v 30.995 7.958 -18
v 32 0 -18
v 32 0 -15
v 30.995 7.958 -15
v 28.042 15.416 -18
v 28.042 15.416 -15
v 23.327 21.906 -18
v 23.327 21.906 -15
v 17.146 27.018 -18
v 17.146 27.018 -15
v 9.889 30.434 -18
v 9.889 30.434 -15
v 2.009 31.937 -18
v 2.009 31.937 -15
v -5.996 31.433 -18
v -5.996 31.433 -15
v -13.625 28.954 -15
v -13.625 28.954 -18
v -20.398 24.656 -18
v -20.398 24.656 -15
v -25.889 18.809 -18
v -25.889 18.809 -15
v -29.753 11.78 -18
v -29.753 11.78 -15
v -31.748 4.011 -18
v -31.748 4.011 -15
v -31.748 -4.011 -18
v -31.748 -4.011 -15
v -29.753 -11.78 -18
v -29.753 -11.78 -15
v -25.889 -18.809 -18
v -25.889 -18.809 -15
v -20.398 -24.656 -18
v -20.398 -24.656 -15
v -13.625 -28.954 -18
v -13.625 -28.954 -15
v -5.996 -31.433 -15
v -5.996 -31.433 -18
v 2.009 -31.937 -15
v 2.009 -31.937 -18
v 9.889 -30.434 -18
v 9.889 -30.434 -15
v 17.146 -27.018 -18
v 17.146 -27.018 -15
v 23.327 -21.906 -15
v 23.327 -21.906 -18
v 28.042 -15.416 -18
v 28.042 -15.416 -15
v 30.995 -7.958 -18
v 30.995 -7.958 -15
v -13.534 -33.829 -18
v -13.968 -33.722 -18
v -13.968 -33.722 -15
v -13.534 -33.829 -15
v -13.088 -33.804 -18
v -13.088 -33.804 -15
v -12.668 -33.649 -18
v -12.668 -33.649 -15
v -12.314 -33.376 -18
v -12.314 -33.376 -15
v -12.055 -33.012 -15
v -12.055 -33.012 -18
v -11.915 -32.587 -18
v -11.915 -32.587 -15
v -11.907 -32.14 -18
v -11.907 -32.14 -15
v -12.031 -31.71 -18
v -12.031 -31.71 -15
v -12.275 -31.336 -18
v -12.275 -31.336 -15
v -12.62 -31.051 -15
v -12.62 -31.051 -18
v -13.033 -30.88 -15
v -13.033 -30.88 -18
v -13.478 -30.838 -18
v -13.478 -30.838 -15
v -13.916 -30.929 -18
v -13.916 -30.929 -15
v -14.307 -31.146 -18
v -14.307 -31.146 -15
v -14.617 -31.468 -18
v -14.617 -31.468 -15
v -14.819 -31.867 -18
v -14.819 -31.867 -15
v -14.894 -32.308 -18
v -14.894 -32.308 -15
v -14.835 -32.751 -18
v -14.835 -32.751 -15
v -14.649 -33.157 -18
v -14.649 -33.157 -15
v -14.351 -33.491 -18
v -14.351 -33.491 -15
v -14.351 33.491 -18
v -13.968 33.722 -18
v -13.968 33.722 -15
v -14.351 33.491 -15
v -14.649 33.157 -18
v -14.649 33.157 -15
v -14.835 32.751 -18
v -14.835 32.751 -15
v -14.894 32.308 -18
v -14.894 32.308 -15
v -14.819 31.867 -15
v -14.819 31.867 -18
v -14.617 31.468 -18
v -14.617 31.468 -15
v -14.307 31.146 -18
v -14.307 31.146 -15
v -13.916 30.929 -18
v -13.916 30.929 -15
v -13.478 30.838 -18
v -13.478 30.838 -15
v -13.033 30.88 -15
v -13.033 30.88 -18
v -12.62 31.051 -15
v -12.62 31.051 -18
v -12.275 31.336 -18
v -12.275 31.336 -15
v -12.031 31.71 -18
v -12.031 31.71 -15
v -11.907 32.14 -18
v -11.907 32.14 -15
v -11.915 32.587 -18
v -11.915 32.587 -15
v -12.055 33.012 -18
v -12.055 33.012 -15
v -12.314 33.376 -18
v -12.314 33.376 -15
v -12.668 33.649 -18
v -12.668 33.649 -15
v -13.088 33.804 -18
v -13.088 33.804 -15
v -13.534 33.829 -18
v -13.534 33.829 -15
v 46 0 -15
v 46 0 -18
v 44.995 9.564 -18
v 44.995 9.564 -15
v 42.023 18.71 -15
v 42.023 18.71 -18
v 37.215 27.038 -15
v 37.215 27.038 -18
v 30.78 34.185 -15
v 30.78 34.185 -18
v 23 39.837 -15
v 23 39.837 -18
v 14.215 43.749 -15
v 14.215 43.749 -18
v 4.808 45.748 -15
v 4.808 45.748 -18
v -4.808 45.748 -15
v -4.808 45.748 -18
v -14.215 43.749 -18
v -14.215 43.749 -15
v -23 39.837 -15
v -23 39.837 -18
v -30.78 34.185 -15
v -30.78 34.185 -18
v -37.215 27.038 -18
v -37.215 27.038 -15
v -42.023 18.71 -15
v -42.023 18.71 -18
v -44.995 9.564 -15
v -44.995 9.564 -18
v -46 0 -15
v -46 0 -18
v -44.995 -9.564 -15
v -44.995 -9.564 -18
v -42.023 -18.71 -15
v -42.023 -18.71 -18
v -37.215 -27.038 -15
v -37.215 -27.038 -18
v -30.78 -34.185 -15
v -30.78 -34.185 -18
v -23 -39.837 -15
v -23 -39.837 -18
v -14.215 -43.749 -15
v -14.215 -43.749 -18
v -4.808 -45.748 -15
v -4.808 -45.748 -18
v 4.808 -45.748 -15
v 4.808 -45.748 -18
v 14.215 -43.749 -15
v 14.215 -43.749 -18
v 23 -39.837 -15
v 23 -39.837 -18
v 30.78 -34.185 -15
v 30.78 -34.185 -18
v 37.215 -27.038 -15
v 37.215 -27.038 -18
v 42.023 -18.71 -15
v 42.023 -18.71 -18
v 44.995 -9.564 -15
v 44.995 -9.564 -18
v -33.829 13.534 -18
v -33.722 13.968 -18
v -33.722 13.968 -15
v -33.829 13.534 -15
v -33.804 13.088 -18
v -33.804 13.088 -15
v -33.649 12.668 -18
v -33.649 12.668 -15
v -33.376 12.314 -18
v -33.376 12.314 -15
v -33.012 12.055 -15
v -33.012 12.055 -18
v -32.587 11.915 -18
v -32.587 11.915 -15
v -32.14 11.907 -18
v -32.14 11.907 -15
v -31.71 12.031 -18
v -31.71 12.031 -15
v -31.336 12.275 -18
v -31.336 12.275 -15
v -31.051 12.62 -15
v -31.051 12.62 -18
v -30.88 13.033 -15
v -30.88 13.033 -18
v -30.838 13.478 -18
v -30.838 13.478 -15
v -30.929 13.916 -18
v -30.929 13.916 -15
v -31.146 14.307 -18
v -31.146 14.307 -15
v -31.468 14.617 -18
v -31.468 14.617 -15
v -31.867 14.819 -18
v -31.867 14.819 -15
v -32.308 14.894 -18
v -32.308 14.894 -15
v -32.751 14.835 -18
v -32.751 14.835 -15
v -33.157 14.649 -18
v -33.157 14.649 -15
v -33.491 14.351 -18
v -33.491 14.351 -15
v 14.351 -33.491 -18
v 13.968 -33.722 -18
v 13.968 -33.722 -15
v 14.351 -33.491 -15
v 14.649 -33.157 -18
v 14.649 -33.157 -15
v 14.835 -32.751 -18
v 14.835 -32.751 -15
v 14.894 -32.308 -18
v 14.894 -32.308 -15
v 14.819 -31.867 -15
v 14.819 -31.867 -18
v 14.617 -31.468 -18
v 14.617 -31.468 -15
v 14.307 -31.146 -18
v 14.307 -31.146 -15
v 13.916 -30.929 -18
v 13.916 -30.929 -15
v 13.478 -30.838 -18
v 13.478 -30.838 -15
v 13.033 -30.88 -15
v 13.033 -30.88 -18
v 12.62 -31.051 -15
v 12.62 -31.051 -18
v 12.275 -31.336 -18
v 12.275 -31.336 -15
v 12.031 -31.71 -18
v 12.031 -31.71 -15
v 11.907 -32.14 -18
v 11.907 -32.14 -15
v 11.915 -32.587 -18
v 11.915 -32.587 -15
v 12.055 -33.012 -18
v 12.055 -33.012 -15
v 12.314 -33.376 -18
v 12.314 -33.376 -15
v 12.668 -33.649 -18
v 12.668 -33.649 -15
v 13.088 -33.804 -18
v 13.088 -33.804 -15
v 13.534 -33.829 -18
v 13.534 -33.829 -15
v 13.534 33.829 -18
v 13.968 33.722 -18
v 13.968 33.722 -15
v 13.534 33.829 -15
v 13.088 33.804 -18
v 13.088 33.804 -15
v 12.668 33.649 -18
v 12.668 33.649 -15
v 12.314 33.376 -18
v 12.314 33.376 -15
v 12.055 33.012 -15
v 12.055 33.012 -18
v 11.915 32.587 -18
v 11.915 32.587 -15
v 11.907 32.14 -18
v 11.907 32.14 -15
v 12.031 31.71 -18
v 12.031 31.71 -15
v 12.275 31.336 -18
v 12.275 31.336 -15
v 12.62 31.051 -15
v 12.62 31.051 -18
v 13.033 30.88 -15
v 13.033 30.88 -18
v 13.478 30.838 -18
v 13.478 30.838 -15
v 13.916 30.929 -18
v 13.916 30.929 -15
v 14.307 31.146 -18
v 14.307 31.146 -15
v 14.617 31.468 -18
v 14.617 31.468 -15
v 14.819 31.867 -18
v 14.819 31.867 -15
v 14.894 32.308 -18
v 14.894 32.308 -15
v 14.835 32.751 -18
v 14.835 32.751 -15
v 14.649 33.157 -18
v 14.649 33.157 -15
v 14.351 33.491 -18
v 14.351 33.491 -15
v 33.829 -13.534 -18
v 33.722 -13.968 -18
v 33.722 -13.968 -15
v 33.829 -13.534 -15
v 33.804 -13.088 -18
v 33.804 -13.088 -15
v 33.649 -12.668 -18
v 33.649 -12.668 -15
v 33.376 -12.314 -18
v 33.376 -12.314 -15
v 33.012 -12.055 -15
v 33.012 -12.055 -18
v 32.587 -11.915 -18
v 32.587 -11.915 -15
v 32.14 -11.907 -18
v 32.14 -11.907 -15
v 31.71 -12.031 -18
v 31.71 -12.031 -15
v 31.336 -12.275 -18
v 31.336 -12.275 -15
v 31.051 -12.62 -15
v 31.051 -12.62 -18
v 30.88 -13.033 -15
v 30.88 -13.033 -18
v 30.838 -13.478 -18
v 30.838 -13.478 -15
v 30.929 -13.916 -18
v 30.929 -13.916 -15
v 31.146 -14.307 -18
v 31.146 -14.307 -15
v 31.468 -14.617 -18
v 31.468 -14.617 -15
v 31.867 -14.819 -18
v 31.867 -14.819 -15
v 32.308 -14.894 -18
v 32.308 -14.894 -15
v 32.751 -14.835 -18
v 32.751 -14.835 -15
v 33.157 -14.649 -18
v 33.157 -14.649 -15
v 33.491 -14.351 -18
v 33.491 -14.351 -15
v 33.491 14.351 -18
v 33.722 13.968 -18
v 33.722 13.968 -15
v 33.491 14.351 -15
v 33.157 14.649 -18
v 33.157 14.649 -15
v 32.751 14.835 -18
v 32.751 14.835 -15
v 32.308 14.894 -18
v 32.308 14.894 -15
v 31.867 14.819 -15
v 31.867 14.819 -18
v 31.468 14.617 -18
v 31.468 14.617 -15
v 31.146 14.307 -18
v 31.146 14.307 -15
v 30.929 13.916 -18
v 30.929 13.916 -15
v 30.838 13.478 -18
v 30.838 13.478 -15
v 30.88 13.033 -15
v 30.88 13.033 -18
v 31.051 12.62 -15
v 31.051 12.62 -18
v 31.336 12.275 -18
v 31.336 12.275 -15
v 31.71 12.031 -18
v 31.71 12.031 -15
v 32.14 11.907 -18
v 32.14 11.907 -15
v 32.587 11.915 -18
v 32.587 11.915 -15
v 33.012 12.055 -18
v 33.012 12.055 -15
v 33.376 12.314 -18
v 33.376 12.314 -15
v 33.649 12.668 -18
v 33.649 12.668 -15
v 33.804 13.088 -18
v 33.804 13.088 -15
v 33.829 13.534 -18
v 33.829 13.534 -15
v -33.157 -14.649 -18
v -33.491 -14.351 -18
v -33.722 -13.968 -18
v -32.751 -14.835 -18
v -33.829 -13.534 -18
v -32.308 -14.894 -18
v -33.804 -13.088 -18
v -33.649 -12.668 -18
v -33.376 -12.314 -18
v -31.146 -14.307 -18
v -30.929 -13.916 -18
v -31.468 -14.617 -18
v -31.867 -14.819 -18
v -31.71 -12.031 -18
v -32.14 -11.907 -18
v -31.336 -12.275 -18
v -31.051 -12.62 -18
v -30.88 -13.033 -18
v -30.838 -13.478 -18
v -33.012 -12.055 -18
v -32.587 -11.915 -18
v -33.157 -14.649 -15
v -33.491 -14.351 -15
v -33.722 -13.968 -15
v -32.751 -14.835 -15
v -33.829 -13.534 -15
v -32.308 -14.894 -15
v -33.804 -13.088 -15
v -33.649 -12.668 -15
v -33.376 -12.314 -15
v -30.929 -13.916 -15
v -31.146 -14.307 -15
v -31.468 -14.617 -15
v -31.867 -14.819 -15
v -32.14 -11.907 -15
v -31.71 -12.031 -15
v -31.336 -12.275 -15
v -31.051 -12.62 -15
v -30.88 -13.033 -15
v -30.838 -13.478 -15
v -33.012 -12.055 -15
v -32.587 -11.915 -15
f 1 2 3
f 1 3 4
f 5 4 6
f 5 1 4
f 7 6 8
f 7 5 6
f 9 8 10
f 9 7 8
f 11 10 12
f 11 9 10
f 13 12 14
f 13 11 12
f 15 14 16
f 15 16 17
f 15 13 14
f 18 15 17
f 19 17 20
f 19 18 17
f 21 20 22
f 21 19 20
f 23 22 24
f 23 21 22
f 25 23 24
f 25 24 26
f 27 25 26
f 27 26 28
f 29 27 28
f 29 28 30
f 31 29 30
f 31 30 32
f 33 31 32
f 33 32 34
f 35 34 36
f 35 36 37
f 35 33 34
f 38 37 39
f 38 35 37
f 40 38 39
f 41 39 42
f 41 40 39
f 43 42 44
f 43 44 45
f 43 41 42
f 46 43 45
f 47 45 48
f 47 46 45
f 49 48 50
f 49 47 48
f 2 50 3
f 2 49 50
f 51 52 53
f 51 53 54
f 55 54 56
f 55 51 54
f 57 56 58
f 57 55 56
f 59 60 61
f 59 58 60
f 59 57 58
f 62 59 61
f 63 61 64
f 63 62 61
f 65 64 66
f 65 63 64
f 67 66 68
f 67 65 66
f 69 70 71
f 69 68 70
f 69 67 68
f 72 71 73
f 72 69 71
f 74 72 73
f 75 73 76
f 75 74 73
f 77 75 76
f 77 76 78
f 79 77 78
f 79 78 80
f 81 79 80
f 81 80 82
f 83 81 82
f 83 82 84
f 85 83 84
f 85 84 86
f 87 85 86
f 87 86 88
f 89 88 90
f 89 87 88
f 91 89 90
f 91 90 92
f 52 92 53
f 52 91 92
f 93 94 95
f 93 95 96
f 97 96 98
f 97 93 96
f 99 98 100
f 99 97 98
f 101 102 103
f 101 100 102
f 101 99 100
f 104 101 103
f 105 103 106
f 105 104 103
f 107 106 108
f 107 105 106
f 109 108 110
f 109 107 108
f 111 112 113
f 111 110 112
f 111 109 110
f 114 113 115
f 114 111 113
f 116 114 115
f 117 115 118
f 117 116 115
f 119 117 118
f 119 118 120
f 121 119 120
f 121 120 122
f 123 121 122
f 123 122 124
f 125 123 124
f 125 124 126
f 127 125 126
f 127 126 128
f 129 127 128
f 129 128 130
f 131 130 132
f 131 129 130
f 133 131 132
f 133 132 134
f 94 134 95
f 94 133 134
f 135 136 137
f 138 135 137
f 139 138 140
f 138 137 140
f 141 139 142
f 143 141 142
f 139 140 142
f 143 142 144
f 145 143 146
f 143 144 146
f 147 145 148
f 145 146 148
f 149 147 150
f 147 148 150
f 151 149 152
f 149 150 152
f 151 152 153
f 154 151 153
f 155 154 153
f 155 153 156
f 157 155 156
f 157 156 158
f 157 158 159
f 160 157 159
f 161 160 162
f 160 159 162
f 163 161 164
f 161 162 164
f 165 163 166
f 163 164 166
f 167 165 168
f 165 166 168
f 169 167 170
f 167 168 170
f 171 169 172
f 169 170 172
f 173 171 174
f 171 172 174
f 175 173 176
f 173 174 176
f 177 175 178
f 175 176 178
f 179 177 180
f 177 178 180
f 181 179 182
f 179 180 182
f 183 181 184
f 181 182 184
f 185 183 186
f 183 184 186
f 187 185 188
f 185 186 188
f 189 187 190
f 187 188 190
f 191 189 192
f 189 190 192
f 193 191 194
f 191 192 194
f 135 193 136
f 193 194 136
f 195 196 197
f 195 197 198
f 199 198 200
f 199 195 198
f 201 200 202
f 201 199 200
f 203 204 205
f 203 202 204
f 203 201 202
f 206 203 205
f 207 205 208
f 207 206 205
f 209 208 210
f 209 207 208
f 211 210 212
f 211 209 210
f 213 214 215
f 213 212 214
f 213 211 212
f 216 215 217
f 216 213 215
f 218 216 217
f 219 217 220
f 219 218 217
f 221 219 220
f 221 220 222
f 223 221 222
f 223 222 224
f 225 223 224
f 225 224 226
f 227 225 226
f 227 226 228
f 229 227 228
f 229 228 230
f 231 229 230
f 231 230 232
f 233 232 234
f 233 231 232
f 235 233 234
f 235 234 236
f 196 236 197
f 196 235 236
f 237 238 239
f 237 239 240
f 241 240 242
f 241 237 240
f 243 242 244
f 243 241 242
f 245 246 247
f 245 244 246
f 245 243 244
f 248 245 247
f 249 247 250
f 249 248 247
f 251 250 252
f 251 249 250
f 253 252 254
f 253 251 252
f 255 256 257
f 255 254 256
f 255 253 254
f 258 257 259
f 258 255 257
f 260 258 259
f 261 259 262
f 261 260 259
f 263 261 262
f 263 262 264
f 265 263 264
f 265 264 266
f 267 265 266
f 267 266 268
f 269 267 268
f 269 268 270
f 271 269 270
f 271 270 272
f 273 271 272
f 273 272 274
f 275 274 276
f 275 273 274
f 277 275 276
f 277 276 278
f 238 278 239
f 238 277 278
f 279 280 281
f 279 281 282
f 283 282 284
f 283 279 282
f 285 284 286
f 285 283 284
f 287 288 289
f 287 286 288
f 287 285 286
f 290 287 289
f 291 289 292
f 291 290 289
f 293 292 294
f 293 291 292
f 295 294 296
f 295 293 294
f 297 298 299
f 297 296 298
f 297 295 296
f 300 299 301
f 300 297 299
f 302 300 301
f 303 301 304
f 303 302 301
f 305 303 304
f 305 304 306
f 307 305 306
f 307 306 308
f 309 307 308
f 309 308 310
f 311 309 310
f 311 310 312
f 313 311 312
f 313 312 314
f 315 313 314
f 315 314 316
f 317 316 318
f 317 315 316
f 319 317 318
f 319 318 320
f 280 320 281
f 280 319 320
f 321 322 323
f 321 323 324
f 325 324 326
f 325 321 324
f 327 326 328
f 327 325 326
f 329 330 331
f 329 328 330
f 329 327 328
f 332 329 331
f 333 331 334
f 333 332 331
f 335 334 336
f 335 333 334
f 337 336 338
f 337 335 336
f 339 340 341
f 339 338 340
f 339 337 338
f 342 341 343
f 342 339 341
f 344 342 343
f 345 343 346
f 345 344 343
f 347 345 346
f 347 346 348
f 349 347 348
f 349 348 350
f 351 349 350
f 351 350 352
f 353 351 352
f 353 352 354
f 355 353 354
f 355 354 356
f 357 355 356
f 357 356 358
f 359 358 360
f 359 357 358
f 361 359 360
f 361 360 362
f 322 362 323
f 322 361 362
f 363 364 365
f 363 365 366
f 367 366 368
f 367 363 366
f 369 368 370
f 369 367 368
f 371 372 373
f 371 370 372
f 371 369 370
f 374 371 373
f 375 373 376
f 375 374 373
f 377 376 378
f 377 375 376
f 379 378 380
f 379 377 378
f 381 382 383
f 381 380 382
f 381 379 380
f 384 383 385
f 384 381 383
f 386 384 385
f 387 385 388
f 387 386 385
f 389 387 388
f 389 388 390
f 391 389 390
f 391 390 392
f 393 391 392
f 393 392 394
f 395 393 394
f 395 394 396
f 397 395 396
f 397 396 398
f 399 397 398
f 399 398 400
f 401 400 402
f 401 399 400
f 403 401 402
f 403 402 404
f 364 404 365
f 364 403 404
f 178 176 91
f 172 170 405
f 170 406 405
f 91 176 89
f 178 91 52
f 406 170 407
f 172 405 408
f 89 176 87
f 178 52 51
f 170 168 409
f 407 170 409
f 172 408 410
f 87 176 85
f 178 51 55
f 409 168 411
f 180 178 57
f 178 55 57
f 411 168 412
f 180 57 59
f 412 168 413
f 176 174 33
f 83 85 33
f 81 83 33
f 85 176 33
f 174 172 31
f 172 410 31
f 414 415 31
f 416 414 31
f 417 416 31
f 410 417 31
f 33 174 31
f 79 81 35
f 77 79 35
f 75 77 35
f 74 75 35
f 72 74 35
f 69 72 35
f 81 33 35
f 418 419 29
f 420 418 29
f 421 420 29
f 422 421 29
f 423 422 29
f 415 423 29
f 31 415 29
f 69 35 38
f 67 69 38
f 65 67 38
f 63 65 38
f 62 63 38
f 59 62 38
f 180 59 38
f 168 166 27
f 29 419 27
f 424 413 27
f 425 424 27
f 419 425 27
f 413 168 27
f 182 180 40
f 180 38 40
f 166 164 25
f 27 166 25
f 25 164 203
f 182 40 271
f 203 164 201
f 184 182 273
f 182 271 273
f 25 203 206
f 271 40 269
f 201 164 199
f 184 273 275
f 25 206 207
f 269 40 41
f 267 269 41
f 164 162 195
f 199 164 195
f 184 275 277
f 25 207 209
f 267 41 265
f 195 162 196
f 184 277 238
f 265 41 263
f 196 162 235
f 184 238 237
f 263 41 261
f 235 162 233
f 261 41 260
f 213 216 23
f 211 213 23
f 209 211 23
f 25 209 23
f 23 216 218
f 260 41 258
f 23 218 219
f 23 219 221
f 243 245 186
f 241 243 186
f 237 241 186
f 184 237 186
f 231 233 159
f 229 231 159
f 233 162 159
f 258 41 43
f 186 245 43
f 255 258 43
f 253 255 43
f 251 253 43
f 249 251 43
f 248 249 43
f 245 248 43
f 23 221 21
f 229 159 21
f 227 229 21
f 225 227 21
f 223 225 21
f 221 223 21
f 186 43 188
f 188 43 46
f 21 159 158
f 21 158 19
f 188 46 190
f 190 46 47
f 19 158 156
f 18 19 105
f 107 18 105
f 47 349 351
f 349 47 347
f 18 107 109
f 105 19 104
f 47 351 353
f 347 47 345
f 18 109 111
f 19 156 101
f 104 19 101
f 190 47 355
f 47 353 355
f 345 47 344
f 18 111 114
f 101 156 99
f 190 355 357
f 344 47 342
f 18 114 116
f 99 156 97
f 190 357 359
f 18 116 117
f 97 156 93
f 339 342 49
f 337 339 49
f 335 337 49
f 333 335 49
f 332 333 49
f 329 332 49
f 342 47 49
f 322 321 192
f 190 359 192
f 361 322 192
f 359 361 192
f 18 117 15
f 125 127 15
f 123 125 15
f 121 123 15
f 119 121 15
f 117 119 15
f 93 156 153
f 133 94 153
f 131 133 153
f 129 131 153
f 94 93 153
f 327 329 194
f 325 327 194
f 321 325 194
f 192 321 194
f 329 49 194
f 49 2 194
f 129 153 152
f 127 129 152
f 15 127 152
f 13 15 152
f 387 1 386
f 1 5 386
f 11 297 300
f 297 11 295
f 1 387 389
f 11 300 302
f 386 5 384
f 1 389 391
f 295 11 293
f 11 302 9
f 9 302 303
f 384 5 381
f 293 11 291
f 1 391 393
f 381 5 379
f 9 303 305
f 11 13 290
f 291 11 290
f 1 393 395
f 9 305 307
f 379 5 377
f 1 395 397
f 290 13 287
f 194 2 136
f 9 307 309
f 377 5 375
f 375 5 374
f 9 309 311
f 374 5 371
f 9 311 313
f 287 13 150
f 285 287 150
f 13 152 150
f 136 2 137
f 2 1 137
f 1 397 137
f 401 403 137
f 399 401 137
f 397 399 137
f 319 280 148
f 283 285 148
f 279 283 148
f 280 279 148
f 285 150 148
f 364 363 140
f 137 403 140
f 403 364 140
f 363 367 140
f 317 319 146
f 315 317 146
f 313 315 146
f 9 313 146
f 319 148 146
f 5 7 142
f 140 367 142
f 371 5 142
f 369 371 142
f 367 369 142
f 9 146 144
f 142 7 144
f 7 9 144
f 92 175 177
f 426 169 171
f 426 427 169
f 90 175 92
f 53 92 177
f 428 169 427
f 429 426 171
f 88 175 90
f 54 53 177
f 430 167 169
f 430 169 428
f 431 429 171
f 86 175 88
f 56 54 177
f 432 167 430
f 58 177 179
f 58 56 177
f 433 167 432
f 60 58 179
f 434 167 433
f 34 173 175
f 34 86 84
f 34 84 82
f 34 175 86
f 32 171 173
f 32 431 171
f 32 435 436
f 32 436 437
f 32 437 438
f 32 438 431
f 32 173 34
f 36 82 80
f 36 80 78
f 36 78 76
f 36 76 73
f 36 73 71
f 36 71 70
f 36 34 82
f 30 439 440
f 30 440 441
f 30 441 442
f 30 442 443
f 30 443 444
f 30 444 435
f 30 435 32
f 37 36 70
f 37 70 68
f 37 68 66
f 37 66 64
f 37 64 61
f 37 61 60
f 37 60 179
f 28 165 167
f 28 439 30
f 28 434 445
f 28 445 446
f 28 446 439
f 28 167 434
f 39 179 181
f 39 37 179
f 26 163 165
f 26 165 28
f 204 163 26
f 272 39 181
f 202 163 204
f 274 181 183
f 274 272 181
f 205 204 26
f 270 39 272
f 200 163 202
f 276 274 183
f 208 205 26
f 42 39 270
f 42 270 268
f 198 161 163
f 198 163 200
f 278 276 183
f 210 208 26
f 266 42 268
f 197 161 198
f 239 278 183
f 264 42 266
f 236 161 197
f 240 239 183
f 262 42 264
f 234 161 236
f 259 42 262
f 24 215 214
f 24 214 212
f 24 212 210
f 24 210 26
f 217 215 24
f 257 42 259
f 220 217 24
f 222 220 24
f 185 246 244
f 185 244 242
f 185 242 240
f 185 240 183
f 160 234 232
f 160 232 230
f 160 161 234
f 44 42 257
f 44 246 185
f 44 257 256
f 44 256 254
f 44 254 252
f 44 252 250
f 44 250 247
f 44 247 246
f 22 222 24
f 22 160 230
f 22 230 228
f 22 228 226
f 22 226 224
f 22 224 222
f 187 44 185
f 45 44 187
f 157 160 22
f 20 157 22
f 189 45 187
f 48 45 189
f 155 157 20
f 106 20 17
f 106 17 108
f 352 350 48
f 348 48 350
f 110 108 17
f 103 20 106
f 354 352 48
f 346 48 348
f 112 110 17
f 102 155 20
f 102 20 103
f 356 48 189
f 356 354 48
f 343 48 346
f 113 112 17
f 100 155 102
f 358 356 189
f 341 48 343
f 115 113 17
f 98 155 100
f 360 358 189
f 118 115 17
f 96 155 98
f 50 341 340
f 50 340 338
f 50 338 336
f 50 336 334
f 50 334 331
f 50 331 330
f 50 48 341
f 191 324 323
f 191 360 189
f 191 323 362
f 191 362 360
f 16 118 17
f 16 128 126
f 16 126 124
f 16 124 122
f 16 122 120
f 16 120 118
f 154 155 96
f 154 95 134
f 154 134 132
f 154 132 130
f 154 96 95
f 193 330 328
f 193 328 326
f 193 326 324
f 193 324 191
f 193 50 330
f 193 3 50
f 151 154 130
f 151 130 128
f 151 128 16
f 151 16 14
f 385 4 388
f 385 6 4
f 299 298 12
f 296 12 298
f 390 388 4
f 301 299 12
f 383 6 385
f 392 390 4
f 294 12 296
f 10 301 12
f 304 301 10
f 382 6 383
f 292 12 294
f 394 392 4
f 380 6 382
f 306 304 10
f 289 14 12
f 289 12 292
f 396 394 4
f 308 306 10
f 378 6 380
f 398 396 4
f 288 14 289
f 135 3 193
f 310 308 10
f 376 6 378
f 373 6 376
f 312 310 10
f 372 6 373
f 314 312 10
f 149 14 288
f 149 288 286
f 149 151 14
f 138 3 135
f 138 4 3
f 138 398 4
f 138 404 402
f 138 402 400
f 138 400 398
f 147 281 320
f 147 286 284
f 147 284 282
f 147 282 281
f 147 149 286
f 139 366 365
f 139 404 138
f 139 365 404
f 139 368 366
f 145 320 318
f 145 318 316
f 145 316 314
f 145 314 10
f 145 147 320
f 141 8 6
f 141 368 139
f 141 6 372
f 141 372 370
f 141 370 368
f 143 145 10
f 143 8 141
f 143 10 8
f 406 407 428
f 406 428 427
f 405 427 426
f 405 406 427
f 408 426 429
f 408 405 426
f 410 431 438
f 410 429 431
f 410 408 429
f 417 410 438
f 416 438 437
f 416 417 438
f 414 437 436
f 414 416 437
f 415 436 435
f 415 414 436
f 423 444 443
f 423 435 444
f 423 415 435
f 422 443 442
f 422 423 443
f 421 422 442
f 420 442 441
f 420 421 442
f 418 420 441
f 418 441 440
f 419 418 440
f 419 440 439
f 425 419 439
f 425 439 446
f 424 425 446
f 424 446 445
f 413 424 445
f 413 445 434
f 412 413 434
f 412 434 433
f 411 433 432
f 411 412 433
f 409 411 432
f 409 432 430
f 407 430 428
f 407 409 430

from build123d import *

# Parameters (mm, degrees)
CYLINDER237_R               = 1.5
CYLINDER237_DEPTH           = 20
CYLINDER237_PLACEMENT_ANGLE = 67.5
CYLINDER244_R               = 1.5
CYLINDER244_DEPTH           = 20
CYLINDER244_PLACEMENT_ANGLE = 112.500001
CYLINDER239_R               = 1.5
CYLINDER239_DEPTH           = 20
CYLINDER239_PLACEMENT_ANGLE = 157.5
CYLINDER242_R               = 1.5
CYLINDER242_DEPTH           = 20
CYLINDER242_PLACEMENT_ANGLE = 202.5
CYLINDER240_R               = 1.5
CYLINDER240_DEPTH           = 20
CYLINDER240_PLACEMENT_ANGLE = 112.500005
CYLINDER243_R               = 1.5
CYLINDER243_DEPTH           = 20
CYLINDER243_PLACEMENT_ANGLE = 67.5
CYLINDER238_R               = 1.5
CYLINDER238_DEPTH           = 20
CYLINDER238_PLACEMENT_ANGLE = 22.5
CYLINDER241_R               = 1.5
CYLINDER241_DEPTH           = 20
CYLINDER241_PLACEMENT_ANGLE = 22.5
TUBE024_R                   = 46
TUBE024_R_2                 = 32
TUBE024_DEPTH               = 3


with BuildPart() as v_lec237:
    # Cylinder237 → Cylinder237 (new body)
    with BuildSketch(Plane.XY):
        Circle(CYLINDER237_R)
    extrude(amount=CYLINDER237_DEPTH)


with BuildPart() as v_lec237_1:
    # Cylinder237 placement: moved
    add(v_lec237.part.moved(Location((13.39392, 32.335784, -22))).rotate(Axis((13.39392, 32.335784, -22), (0, 0, 1)), CYLINDER237_PLACEMENT_ANGLE))


with BuildPart() as v_lec244:
    # Cylinder244 → Cylinder244 (new body)
    with BuildSketch(Plane.XY):
        Circle(CYLINDER244_R)
    extrude(amount=CYLINDER244_DEPTH)


with BuildPart() as v_lec244_1:
    # Cylinder244 placement: moved
    add(v_lec244.part.moved(Location((-13.39392, 32.335784, -22))).rotate(Axis((-13.39392, 32.335784, -22), (0, 0, 1)), CYLINDER244_PLACEMENT_ANGLE))


with BuildPart() as v_lec239:
    # Cylinder239 → Cylinder239 (new body)
    with BuildSketch(Plane.XY):
        Circle(CYLINDER239_R)
    extrude(amount=CYLINDER239_DEPTH)


with BuildPart() as v_lec239_1:
    # Cylinder239 placement: moved
    add(v_lec239.part.moved(Location((-32.335784, 13.39392, -22))).rotate(Axis((-32.335784, 13.39392, -22), (0, 0, 1)), CYLINDER239_PLACEMENT_ANGLE))


with BuildPart() as v_lec242:
    # Cylinder242 → Cylinder242 (new body)
    with BuildSketch(Plane.XY):
        Circle(CYLINDER242_R)
    extrude(amount=CYLINDER242_DEPTH)


with BuildPart() as v_lec242_1:
    # Cylinder242 placement: moved
    add(v_lec242.part.moved(Location((-32.335784, -13.39392, -22))).rotate(Axis((-32.335784, -13.39392, -22), (0, 0, 1)), CYLINDER242_PLACEMENT_ANGLE))


with BuildPart() as v_lec240:
    # Cylinder240 → Cylinder240 (new body)
    with BuildSketch(Plane.XY):
        Circle(CYLINDER240_R)
    extrude(amount=CYLINDER240_DEPTH)


with BuildPart() as v_lec240_1:
    # Cylinder240 placement: moved
    add(v_lec240.part.moved(Location((-13.39392, -32.335784, -22))).rotate(Axis((-13.39392, -32.335784, -22), (0, 0, -1)), CYLINDER240_PLACEMENT_ANGLE))


with BuildPart() as v_lec243:
    # Cylinder243 → Cylinder243 (new body)
    with BuildSketch(Plane.XY):
        Circle(CYLINDER243_R)
    extrude(amount=CYLINDER243_DEPTH)


with BuildPart() as v_lec243_1:
    # Cylinder243 placement: moved
    add(v_lec243.part.moved(Location((13.39392, -32.335784, -22))).rotate(Axis((13.39392, -32.335784, -22), (0, 0, -1)), CYLINDER243_PLACEMENT_ANGLE))


with BuildPart() as v_lec238:
    # Cylinder238 → Cylinder238 (new body)
    with BuildSketch(Plane.XY):
        Circle(CYLINDER238_R)
    extrude(amount=CYLINDER238_DEPTH)


with BuildPart() as v_lec238_1:
    # Cylinder238 placement: moved
    add(v_lec238.part.moved(Location((32.335784, -13.39392, -22))).rotate(Axis((32.335784, -13.39392, -22), (0, 0, -1)), CYLINDER238_PLACEMENT_ANGLE))


with BuildPart() as compound223:
    # Cylinder241 → Cylinder241 (new body)
    with BuildSketch(Plane.XY):
        Circle(CYLINDER241_R)
    extrude(amount=CYLINDER241_DEPTH)


with BuildPart() as compound223_1:
    # Cylinder241 placement: moved
    add(compound223.part.moved(Location((32.335784, 13.39392, -22))).rotate(Axis((32.335784, 13.39392, -22), (0, 0, 1)), CYLINDER241_PLACEMENT_ANGLE))

    # Compound223: union Válec237, Válec244, Válec239, Válec242, Válec240, Válec243, Válec238
    add(v_lec237_1.part)
    add(v_lec244_1.part)
    add(v_lec239_1.part)
    add(v_lec242_1.part)
    add(v_lec240_1.part)
    add(v_lec243_1.part)
    add(v_lec238_1.part)


with BuildPart() as compound223_2:
    # Compound223 placement: moved
    add(compound223_1.part.moved(Location((0, 0, 2))))


with BuildPart() as dilatacka_podmotorni:
    # Tube024 → Tube024 (new body)
    with BuildSketch(Plane.XY.offset(-18)):
        Circle(TUBE024_R)
        Circle(TUBE024_R_2, mode=Mode.SUBTRACT)
    extrude(amount=TUBE024_DEPTH)

    # Cut117: cut Compound223
    add(compound223_2.part, mode=Mode.SUBTRACT)


solid = dilatacka_podmotorni.part
